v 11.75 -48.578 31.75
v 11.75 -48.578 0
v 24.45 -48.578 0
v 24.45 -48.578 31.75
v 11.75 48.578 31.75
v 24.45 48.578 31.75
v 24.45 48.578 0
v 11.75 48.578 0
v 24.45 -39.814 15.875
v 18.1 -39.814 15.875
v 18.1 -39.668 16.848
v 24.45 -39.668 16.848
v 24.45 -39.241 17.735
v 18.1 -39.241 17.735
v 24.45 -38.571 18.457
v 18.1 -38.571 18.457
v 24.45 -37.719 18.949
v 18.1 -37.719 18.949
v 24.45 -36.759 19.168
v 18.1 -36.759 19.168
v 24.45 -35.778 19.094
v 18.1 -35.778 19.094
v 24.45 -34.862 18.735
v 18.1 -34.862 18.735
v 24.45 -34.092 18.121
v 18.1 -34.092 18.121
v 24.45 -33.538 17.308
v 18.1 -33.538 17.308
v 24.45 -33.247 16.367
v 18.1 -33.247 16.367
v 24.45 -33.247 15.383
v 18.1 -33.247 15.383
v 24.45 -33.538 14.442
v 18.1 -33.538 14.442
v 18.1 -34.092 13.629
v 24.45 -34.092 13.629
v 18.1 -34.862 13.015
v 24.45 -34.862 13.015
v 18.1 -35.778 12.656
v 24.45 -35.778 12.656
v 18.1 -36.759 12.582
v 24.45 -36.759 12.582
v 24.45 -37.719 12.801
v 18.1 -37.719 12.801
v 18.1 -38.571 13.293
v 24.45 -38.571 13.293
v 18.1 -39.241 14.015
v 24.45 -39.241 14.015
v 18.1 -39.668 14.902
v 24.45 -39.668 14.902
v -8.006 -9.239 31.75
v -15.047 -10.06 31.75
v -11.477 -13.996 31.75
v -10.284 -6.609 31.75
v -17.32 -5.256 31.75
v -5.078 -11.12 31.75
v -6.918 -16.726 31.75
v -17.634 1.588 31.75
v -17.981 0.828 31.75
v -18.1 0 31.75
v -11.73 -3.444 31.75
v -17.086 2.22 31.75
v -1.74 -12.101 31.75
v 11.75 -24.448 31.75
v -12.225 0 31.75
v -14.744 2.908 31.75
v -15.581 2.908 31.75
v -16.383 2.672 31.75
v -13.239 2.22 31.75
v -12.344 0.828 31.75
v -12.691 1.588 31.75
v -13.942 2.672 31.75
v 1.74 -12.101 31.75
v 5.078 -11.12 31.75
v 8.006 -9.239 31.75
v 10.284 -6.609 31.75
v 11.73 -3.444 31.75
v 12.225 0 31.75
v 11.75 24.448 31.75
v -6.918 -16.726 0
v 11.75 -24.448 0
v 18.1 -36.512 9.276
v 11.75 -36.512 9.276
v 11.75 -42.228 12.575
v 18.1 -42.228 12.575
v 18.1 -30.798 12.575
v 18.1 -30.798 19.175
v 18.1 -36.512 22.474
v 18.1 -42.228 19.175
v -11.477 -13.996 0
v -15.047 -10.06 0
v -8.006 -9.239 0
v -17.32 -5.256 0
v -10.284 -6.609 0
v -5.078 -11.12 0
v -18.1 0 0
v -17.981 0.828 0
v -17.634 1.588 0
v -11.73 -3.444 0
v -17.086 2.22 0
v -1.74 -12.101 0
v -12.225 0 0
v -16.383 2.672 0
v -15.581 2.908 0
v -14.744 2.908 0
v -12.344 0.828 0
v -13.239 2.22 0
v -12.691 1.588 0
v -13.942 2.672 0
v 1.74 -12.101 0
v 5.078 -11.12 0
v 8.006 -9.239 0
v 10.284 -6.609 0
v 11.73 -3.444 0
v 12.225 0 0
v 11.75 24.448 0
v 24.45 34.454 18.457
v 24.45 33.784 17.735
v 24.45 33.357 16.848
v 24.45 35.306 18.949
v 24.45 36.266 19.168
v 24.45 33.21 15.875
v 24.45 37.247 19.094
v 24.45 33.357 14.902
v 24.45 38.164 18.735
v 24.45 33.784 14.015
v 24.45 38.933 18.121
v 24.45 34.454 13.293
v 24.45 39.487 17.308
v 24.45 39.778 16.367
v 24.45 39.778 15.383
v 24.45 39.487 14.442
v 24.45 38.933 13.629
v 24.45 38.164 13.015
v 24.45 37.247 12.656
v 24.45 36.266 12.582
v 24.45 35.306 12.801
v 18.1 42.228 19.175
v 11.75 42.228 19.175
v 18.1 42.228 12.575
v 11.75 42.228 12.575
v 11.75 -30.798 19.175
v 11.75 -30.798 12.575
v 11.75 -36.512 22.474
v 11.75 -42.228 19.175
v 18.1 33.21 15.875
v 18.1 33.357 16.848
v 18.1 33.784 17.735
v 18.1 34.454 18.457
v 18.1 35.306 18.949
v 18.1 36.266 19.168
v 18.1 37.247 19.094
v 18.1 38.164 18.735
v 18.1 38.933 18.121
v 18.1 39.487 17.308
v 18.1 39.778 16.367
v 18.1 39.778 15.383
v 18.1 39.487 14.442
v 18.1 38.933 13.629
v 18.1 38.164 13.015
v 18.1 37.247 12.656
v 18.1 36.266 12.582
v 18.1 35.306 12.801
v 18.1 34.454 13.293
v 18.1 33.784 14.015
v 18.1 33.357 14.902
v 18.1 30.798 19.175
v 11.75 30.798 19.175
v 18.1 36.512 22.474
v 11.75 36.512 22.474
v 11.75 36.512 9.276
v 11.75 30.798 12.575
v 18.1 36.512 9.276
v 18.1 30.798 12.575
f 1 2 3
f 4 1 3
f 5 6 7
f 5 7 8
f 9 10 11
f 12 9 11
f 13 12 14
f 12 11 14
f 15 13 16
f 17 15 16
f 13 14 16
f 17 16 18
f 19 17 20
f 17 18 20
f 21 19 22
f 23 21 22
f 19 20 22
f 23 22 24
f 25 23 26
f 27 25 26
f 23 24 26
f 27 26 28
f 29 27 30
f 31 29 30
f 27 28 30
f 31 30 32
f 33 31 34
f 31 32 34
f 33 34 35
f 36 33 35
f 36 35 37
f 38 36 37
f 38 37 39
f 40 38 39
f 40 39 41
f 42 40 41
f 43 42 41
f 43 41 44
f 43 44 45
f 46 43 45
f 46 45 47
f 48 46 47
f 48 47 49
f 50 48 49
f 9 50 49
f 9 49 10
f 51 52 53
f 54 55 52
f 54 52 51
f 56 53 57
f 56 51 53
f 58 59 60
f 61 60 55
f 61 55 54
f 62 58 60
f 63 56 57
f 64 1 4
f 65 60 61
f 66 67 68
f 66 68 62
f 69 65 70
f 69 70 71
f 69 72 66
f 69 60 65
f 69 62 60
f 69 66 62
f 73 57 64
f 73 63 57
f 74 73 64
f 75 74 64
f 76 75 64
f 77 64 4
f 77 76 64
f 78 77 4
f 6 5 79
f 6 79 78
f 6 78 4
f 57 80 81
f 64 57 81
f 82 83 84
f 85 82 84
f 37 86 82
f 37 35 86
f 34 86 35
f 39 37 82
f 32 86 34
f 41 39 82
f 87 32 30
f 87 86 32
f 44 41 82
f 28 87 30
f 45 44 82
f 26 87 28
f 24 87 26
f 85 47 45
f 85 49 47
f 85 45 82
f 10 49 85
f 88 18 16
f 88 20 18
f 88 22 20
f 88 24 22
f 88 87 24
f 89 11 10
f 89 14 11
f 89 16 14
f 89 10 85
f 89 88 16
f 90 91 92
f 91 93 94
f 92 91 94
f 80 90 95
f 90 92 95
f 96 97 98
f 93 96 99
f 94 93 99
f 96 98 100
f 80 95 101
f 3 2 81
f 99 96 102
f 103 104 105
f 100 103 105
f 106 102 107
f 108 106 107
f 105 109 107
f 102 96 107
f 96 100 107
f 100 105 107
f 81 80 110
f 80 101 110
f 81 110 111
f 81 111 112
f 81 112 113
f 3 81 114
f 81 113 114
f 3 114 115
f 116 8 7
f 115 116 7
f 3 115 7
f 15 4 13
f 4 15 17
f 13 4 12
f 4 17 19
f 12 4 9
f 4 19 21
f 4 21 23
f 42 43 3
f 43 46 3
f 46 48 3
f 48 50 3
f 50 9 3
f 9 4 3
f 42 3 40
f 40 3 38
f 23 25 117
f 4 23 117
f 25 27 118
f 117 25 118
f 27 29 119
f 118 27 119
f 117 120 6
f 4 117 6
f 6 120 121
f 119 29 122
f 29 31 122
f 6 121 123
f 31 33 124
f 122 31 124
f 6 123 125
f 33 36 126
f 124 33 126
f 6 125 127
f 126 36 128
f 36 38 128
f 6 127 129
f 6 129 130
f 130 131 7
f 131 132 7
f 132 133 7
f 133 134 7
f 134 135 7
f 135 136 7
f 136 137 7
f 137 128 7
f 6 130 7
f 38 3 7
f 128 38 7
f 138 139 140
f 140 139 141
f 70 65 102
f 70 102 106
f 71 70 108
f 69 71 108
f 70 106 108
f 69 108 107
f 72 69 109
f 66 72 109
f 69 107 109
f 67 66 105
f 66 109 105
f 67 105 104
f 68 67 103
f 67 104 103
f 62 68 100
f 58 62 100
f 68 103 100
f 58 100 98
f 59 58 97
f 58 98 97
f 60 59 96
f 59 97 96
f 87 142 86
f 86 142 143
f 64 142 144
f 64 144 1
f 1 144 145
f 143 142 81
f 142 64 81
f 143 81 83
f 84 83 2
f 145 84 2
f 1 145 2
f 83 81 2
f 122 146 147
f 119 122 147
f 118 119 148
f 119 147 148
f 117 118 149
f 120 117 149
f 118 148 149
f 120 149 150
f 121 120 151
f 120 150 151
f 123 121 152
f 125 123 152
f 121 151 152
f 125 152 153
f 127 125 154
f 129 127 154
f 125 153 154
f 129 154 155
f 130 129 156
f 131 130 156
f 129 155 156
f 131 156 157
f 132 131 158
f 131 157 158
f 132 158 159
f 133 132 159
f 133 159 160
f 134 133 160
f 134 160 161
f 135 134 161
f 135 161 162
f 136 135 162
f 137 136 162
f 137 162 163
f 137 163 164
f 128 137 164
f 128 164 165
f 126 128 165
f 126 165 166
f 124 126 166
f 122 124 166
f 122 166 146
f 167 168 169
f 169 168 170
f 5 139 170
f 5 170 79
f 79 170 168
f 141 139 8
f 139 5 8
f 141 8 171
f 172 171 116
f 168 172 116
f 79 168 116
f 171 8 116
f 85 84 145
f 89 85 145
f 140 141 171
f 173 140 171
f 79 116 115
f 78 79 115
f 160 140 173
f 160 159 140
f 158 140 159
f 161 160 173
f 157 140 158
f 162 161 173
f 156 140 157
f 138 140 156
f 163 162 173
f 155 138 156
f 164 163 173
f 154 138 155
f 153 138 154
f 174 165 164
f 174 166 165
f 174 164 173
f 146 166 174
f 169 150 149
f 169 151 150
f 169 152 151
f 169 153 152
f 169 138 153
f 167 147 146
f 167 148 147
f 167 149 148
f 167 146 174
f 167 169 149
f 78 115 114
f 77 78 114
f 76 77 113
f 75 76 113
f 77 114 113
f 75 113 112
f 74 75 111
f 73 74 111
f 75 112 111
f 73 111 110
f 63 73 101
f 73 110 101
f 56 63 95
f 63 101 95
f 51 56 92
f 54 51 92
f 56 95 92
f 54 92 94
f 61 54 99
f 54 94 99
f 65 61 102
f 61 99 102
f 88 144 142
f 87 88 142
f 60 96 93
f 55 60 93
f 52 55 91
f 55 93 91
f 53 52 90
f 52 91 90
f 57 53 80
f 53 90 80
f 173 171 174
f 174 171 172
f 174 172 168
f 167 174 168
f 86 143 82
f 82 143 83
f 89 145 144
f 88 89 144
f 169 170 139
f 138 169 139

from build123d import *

# Parameters (mm, degrees)
F3_DEPTH = 31.75
F4_R     = 3.302
F5_DEPTH = 12.7
F6_DEPTH = 6.35


with BuildPart() as f3:
    # F2 (on Top) → F3 (new body)
    with BuildSketch(Plane.XY):
        with BuildLine():
            Line((24.45, -48.5775), (24.45, 48.5775))
            Line((24.45, 48.5775), (11.75, 48.5775))
            Line((11.75, 48.5775), (11.75, 24.4475))
            Line((11.75, 24.4475), (12.225, 0))
            ThreePointArc((12.225, 0), (0, -12.225), (-12.225, 0))
            ThreePointArc((-12.225, 0), (-15.1625, 2.9375), (-18.1, 0))
            ThreePointArc((-18.1, 0), (-15.0471149103, -10.0595393968), (-6.9183057596, -16.7256403589))
            Line((-6.9183057596, -16.7256403589), (11.75, -24.4475))
            Line((11.75, -24.4475), (11.75, -48.5775))
            Line((11.75, -48.5775), (24.45, -48.5775))
        make_face()
    extrude(amount=F3_DEPTH)

    # F4 (on face) → F5 (cut, through all)
    with BuildSketch(Plane(origin=(11.75, 0, 0), x_dir=(0, -1, 0), z_dir=(-1, 0, 0))):
        with Locations((-36.5125, 15.875)):
            Circle(F4_R)
        with Locations((36.5125, 15.875)):
            Circle(F4_R)
    extrude(amount=-F5_DEPTH, mode=Mode.SUBTRACT)

    # F4 (on face) → F6 (cut)
    with BuildSketch(Plane(origin=(11.75, 0, 0), x_dir=(0, -1, 0), z_dir=(-1, 0, 0))):
        Polygon((-30.7975, 12.5754432116), (-30.7975, 19.1745567884), (-36.5125, 22.4741135768), (-42.2275, 19.1745567884), (-42.2275, 12.5754432116), (-36.5125, 9.2758864232), align=None)
        with Locations((-36.5125, 15.875)):
            Circle(F4_R, mode=Mode.SUBTRACT)
        Polygon((30.7975, 19.1745567884), (30.7975, 12.5754432116), (36.5125, 9.2758864232), (42.2275, 12.5754432116), (42.2275, 19.1745567884), (36.5125, 22.4741135768), align=None)
        with Locations((36.5125, 15.875)):
            Circle(F4_R, mode=Mode.SUBTRACT)
    extrude(amount=-F6_DEPTH, mode=Mode.SUBTRACT)


solid = f3.part
